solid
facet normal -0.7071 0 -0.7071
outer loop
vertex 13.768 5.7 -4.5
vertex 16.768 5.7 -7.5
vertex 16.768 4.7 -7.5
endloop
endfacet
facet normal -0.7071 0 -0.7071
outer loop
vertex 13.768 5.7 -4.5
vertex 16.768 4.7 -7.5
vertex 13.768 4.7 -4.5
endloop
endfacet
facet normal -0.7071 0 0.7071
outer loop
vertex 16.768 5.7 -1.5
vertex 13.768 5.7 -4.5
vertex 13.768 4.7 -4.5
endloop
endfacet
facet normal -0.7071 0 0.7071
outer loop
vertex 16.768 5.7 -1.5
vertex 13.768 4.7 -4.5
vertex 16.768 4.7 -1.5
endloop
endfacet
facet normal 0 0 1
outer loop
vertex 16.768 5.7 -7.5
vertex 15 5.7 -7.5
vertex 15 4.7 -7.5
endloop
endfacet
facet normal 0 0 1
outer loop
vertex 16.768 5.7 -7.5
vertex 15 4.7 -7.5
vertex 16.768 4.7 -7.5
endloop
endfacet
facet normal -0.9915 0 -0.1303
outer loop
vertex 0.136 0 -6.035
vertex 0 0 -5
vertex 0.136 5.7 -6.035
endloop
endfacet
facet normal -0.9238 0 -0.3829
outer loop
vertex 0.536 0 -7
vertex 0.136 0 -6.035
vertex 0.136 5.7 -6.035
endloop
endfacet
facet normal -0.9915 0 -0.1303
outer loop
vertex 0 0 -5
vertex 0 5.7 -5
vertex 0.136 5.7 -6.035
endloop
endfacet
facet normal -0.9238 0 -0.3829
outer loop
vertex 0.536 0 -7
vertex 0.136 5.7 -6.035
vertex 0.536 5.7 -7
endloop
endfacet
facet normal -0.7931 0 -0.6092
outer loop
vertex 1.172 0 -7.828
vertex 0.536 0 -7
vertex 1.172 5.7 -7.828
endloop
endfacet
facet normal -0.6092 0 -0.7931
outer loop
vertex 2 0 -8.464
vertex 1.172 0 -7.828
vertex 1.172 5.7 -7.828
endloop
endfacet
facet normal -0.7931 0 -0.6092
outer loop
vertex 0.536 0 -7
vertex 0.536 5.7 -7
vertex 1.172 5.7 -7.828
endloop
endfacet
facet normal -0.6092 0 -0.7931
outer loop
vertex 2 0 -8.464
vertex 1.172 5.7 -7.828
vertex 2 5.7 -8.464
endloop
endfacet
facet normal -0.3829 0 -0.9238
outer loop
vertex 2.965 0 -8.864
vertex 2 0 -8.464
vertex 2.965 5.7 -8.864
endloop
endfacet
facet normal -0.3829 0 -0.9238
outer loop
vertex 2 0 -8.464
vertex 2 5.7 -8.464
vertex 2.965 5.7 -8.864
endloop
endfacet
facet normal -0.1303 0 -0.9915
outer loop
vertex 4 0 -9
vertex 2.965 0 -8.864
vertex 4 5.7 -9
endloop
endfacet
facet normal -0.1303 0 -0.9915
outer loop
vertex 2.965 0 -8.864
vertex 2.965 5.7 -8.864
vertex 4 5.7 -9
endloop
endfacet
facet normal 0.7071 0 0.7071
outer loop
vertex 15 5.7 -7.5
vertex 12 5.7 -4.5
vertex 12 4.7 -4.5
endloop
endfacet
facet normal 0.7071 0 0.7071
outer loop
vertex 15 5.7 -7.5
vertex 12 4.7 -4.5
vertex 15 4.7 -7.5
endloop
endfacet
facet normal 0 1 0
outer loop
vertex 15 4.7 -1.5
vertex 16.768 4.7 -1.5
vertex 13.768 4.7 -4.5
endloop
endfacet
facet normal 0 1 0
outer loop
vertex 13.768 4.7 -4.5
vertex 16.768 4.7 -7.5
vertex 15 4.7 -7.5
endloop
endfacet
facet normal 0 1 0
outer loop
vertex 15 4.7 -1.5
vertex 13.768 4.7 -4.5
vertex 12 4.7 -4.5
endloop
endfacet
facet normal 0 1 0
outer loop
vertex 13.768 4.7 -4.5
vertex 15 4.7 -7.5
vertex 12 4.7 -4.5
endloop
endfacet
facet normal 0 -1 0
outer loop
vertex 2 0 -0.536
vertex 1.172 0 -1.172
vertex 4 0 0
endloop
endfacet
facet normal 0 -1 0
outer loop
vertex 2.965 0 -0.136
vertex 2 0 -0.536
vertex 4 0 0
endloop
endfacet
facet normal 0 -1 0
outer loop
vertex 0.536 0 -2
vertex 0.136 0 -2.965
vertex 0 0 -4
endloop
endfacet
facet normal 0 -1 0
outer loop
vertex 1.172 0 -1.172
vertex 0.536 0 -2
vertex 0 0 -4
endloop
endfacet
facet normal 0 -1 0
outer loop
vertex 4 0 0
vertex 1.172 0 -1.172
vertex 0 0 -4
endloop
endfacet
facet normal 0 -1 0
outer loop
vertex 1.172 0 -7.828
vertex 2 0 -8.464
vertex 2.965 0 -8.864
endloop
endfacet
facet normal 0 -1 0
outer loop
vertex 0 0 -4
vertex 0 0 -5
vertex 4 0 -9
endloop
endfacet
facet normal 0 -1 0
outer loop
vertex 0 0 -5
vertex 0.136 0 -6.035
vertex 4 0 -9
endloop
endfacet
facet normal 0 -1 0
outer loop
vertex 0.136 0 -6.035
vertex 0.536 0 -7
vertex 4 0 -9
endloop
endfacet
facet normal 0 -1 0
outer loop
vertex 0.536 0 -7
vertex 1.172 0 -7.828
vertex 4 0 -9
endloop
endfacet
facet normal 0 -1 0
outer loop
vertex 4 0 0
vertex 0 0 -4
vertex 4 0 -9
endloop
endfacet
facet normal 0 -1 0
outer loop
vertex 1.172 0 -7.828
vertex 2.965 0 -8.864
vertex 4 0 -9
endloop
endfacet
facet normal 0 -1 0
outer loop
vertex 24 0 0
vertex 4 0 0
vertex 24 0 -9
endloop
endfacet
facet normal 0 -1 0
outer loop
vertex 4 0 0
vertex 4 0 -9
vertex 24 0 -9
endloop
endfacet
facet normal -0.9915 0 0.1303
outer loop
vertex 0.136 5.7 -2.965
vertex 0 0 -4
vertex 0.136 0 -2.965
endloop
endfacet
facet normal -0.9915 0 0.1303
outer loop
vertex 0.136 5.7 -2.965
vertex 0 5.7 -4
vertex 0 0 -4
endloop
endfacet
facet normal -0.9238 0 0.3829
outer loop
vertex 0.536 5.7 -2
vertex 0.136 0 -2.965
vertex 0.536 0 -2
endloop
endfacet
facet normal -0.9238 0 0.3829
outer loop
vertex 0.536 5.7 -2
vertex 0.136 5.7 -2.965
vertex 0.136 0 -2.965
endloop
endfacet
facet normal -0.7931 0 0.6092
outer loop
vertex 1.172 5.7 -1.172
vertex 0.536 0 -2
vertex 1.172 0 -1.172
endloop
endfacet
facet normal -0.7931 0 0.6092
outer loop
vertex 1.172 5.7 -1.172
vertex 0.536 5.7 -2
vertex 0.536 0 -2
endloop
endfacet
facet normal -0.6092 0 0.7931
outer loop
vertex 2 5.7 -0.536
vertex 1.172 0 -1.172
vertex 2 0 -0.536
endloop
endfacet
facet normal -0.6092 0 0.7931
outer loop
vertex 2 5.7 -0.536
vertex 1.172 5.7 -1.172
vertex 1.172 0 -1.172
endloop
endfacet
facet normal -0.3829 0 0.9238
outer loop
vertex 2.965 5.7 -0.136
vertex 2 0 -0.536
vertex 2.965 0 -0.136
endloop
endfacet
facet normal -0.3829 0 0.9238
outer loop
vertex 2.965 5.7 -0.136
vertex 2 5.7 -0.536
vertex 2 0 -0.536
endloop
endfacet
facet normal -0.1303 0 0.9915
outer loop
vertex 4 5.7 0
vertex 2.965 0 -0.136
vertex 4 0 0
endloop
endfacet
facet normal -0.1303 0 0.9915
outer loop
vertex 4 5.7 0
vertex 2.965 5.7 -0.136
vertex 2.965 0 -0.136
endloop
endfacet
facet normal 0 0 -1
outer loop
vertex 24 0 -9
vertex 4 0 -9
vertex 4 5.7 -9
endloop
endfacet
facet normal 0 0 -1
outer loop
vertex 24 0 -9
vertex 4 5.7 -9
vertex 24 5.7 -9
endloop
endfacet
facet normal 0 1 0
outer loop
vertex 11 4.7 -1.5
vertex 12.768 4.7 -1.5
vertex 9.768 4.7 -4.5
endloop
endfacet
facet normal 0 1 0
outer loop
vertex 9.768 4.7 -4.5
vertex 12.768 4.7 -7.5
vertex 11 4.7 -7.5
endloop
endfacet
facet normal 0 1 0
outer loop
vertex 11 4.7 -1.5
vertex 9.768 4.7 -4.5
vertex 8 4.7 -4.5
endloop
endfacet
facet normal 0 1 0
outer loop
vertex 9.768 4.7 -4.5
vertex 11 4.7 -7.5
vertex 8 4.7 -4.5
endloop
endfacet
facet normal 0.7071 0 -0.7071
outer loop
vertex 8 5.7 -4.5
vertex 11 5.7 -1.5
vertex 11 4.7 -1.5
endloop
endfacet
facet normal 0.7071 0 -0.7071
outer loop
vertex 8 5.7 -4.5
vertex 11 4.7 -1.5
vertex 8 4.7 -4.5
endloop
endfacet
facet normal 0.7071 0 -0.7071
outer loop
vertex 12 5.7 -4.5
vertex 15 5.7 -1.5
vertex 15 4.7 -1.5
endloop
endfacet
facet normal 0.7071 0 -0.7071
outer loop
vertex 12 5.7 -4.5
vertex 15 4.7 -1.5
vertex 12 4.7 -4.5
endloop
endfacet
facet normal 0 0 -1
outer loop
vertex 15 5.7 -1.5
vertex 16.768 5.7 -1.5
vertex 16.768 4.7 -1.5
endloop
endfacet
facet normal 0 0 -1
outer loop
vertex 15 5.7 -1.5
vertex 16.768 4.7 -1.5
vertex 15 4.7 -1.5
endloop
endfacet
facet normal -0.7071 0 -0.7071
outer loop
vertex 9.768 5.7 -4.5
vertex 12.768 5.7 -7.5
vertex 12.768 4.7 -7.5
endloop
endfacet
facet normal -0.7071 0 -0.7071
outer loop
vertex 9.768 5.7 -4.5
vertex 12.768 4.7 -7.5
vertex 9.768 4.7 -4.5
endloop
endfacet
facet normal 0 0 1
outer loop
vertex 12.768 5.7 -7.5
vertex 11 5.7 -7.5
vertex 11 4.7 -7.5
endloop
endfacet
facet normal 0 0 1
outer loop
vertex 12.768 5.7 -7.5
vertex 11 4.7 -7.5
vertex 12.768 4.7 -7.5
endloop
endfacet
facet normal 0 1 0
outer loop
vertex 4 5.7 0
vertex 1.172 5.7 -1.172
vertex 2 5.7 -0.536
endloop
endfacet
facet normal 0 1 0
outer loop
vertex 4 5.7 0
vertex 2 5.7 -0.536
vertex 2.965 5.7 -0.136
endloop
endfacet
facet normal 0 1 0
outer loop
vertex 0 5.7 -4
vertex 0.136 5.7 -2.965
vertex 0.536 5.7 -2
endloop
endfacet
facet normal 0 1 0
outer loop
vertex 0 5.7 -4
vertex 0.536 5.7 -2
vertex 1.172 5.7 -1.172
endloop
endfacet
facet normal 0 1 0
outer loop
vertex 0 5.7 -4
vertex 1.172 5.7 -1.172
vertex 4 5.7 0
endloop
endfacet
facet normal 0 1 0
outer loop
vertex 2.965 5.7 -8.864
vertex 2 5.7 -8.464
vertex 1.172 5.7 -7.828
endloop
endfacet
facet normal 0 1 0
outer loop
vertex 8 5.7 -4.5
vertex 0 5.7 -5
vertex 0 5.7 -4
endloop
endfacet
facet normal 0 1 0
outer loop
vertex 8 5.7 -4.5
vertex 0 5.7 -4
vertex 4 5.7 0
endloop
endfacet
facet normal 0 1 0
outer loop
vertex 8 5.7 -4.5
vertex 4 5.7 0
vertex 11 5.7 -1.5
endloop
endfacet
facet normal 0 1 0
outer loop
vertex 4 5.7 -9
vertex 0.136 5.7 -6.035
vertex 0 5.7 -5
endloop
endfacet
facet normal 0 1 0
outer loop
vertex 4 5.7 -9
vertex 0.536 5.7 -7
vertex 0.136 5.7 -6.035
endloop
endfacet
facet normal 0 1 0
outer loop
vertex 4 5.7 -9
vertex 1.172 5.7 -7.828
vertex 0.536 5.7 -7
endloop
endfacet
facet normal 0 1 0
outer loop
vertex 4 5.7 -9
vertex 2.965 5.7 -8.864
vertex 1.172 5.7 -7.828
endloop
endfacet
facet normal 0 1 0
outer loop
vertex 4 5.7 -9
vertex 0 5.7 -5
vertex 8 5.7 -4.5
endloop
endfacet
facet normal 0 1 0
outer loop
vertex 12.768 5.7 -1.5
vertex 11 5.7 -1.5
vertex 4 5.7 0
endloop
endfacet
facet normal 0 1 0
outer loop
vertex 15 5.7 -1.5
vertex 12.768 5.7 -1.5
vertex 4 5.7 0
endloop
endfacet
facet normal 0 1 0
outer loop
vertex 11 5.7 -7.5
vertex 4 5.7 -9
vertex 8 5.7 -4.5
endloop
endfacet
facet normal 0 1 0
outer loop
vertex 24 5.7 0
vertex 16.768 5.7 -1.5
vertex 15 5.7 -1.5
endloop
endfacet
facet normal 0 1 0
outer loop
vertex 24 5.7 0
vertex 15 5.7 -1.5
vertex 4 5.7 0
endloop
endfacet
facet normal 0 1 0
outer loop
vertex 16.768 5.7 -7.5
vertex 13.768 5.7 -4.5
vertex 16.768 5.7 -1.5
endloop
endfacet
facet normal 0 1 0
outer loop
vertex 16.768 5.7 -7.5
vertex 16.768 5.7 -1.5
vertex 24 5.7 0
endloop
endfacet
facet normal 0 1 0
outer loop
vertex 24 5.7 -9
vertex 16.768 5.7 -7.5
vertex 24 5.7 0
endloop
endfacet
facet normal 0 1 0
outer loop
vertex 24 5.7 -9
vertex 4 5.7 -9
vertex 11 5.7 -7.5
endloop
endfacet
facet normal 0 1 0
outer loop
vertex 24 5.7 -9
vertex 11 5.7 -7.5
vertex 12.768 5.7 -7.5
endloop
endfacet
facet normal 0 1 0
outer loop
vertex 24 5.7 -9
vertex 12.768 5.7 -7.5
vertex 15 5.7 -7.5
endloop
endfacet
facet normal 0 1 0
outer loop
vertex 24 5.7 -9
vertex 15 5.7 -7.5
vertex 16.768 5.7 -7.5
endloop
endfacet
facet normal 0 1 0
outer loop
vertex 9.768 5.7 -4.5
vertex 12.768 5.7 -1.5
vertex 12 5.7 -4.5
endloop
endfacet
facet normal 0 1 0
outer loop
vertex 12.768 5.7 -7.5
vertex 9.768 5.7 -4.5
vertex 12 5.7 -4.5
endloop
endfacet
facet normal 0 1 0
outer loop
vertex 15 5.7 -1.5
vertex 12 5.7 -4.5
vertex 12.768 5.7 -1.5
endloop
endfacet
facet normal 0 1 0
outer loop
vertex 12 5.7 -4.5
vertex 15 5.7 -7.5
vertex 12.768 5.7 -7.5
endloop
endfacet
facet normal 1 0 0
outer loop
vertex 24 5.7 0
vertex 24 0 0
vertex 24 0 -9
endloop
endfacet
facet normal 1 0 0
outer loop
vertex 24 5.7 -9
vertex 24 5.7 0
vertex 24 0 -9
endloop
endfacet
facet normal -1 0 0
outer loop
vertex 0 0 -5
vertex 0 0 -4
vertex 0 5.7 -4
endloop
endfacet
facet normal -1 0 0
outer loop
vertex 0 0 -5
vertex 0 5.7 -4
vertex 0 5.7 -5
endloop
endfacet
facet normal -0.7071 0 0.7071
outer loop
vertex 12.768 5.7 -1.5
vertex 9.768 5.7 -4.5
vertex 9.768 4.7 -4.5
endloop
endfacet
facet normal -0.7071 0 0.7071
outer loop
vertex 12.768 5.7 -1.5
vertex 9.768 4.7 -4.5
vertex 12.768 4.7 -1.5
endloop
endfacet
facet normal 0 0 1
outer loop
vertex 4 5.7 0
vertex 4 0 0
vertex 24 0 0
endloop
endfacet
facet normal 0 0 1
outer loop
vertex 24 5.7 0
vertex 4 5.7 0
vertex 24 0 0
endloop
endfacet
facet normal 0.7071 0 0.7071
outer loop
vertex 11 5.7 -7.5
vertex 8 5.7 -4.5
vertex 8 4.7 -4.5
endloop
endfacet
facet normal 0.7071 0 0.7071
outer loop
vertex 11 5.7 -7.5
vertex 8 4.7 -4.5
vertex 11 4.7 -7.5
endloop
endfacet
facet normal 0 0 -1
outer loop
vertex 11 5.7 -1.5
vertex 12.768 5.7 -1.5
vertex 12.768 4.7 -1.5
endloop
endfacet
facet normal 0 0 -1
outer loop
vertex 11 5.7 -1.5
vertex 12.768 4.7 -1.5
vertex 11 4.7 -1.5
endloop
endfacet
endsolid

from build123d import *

# Parameters (mm, degrees)
SKETCH1_W           = 24
SKETCH1_H           = 9
BOSS_EXTRUDE1_DEPTH = 5.7
FILLET1_R           = 4
FILLET2_R           = 4
CUT_EXTRUDE2_DEPTH  = 1
LPATTERN1_COUNT     = 2
LPATTERN1_PITCH     = 4


with BuildPart() as part:
    # Sketch1 → Boss-Extrude1 (new body)
    with BuildSketch(Plane(origin=(0, 0, 0), x_dir=(1, 0, 0), z_dir=(0, 1, 0))):
        with Locations((12, 4.5)):
            Rectangle(SKETCH1_W, SKETCH1_H)
    extrude(amount=BOSS_EXTRUDE1_DEPTH)

    # Fillet1
    fillet1_edges = [part.edges().sort_by_distance(p)[0] for p in [
        (0, 2.85, 0),
    ]]
    fillet(fillet1_edges, radius=FILLET1_R)

    # Fillet2
    fillet2_edges = [part.edges().sort_by_distance(p)[0] for p in [
        (0, 2.85, -9),
    ]]
    fillet(fillet2_edges, radius=FILLET2_R)

    # Sketch2 → Cut-Extrude2 (cut)
    with BuildSketch(Plane(origin=(0, 5.7, 0), x_dir=(1, 0, 0), z_dir=(0, 1, 0))):
        Polygon((12.767766953, 1.5), (11, 1.5), (8, 4.5), (11, 7.5), (12.767766953, 7.5), (9.767766953, 4.5), align=None)
    cut_extrude2 = extrude(amount=-CUT_EXTRUDE2_DEPTH, mode=Mode.SUBTRACT)

    # LPattern1: Cut-Extrude2 ×2
    with Locations(*[(i * LPATTERN1_PITCH, 0, 0) for i in range(1, LPATTERN1_COUNT)]):
        add(cut_extrude2, mode=Mode.SUBTRACT)


solid = part.part
